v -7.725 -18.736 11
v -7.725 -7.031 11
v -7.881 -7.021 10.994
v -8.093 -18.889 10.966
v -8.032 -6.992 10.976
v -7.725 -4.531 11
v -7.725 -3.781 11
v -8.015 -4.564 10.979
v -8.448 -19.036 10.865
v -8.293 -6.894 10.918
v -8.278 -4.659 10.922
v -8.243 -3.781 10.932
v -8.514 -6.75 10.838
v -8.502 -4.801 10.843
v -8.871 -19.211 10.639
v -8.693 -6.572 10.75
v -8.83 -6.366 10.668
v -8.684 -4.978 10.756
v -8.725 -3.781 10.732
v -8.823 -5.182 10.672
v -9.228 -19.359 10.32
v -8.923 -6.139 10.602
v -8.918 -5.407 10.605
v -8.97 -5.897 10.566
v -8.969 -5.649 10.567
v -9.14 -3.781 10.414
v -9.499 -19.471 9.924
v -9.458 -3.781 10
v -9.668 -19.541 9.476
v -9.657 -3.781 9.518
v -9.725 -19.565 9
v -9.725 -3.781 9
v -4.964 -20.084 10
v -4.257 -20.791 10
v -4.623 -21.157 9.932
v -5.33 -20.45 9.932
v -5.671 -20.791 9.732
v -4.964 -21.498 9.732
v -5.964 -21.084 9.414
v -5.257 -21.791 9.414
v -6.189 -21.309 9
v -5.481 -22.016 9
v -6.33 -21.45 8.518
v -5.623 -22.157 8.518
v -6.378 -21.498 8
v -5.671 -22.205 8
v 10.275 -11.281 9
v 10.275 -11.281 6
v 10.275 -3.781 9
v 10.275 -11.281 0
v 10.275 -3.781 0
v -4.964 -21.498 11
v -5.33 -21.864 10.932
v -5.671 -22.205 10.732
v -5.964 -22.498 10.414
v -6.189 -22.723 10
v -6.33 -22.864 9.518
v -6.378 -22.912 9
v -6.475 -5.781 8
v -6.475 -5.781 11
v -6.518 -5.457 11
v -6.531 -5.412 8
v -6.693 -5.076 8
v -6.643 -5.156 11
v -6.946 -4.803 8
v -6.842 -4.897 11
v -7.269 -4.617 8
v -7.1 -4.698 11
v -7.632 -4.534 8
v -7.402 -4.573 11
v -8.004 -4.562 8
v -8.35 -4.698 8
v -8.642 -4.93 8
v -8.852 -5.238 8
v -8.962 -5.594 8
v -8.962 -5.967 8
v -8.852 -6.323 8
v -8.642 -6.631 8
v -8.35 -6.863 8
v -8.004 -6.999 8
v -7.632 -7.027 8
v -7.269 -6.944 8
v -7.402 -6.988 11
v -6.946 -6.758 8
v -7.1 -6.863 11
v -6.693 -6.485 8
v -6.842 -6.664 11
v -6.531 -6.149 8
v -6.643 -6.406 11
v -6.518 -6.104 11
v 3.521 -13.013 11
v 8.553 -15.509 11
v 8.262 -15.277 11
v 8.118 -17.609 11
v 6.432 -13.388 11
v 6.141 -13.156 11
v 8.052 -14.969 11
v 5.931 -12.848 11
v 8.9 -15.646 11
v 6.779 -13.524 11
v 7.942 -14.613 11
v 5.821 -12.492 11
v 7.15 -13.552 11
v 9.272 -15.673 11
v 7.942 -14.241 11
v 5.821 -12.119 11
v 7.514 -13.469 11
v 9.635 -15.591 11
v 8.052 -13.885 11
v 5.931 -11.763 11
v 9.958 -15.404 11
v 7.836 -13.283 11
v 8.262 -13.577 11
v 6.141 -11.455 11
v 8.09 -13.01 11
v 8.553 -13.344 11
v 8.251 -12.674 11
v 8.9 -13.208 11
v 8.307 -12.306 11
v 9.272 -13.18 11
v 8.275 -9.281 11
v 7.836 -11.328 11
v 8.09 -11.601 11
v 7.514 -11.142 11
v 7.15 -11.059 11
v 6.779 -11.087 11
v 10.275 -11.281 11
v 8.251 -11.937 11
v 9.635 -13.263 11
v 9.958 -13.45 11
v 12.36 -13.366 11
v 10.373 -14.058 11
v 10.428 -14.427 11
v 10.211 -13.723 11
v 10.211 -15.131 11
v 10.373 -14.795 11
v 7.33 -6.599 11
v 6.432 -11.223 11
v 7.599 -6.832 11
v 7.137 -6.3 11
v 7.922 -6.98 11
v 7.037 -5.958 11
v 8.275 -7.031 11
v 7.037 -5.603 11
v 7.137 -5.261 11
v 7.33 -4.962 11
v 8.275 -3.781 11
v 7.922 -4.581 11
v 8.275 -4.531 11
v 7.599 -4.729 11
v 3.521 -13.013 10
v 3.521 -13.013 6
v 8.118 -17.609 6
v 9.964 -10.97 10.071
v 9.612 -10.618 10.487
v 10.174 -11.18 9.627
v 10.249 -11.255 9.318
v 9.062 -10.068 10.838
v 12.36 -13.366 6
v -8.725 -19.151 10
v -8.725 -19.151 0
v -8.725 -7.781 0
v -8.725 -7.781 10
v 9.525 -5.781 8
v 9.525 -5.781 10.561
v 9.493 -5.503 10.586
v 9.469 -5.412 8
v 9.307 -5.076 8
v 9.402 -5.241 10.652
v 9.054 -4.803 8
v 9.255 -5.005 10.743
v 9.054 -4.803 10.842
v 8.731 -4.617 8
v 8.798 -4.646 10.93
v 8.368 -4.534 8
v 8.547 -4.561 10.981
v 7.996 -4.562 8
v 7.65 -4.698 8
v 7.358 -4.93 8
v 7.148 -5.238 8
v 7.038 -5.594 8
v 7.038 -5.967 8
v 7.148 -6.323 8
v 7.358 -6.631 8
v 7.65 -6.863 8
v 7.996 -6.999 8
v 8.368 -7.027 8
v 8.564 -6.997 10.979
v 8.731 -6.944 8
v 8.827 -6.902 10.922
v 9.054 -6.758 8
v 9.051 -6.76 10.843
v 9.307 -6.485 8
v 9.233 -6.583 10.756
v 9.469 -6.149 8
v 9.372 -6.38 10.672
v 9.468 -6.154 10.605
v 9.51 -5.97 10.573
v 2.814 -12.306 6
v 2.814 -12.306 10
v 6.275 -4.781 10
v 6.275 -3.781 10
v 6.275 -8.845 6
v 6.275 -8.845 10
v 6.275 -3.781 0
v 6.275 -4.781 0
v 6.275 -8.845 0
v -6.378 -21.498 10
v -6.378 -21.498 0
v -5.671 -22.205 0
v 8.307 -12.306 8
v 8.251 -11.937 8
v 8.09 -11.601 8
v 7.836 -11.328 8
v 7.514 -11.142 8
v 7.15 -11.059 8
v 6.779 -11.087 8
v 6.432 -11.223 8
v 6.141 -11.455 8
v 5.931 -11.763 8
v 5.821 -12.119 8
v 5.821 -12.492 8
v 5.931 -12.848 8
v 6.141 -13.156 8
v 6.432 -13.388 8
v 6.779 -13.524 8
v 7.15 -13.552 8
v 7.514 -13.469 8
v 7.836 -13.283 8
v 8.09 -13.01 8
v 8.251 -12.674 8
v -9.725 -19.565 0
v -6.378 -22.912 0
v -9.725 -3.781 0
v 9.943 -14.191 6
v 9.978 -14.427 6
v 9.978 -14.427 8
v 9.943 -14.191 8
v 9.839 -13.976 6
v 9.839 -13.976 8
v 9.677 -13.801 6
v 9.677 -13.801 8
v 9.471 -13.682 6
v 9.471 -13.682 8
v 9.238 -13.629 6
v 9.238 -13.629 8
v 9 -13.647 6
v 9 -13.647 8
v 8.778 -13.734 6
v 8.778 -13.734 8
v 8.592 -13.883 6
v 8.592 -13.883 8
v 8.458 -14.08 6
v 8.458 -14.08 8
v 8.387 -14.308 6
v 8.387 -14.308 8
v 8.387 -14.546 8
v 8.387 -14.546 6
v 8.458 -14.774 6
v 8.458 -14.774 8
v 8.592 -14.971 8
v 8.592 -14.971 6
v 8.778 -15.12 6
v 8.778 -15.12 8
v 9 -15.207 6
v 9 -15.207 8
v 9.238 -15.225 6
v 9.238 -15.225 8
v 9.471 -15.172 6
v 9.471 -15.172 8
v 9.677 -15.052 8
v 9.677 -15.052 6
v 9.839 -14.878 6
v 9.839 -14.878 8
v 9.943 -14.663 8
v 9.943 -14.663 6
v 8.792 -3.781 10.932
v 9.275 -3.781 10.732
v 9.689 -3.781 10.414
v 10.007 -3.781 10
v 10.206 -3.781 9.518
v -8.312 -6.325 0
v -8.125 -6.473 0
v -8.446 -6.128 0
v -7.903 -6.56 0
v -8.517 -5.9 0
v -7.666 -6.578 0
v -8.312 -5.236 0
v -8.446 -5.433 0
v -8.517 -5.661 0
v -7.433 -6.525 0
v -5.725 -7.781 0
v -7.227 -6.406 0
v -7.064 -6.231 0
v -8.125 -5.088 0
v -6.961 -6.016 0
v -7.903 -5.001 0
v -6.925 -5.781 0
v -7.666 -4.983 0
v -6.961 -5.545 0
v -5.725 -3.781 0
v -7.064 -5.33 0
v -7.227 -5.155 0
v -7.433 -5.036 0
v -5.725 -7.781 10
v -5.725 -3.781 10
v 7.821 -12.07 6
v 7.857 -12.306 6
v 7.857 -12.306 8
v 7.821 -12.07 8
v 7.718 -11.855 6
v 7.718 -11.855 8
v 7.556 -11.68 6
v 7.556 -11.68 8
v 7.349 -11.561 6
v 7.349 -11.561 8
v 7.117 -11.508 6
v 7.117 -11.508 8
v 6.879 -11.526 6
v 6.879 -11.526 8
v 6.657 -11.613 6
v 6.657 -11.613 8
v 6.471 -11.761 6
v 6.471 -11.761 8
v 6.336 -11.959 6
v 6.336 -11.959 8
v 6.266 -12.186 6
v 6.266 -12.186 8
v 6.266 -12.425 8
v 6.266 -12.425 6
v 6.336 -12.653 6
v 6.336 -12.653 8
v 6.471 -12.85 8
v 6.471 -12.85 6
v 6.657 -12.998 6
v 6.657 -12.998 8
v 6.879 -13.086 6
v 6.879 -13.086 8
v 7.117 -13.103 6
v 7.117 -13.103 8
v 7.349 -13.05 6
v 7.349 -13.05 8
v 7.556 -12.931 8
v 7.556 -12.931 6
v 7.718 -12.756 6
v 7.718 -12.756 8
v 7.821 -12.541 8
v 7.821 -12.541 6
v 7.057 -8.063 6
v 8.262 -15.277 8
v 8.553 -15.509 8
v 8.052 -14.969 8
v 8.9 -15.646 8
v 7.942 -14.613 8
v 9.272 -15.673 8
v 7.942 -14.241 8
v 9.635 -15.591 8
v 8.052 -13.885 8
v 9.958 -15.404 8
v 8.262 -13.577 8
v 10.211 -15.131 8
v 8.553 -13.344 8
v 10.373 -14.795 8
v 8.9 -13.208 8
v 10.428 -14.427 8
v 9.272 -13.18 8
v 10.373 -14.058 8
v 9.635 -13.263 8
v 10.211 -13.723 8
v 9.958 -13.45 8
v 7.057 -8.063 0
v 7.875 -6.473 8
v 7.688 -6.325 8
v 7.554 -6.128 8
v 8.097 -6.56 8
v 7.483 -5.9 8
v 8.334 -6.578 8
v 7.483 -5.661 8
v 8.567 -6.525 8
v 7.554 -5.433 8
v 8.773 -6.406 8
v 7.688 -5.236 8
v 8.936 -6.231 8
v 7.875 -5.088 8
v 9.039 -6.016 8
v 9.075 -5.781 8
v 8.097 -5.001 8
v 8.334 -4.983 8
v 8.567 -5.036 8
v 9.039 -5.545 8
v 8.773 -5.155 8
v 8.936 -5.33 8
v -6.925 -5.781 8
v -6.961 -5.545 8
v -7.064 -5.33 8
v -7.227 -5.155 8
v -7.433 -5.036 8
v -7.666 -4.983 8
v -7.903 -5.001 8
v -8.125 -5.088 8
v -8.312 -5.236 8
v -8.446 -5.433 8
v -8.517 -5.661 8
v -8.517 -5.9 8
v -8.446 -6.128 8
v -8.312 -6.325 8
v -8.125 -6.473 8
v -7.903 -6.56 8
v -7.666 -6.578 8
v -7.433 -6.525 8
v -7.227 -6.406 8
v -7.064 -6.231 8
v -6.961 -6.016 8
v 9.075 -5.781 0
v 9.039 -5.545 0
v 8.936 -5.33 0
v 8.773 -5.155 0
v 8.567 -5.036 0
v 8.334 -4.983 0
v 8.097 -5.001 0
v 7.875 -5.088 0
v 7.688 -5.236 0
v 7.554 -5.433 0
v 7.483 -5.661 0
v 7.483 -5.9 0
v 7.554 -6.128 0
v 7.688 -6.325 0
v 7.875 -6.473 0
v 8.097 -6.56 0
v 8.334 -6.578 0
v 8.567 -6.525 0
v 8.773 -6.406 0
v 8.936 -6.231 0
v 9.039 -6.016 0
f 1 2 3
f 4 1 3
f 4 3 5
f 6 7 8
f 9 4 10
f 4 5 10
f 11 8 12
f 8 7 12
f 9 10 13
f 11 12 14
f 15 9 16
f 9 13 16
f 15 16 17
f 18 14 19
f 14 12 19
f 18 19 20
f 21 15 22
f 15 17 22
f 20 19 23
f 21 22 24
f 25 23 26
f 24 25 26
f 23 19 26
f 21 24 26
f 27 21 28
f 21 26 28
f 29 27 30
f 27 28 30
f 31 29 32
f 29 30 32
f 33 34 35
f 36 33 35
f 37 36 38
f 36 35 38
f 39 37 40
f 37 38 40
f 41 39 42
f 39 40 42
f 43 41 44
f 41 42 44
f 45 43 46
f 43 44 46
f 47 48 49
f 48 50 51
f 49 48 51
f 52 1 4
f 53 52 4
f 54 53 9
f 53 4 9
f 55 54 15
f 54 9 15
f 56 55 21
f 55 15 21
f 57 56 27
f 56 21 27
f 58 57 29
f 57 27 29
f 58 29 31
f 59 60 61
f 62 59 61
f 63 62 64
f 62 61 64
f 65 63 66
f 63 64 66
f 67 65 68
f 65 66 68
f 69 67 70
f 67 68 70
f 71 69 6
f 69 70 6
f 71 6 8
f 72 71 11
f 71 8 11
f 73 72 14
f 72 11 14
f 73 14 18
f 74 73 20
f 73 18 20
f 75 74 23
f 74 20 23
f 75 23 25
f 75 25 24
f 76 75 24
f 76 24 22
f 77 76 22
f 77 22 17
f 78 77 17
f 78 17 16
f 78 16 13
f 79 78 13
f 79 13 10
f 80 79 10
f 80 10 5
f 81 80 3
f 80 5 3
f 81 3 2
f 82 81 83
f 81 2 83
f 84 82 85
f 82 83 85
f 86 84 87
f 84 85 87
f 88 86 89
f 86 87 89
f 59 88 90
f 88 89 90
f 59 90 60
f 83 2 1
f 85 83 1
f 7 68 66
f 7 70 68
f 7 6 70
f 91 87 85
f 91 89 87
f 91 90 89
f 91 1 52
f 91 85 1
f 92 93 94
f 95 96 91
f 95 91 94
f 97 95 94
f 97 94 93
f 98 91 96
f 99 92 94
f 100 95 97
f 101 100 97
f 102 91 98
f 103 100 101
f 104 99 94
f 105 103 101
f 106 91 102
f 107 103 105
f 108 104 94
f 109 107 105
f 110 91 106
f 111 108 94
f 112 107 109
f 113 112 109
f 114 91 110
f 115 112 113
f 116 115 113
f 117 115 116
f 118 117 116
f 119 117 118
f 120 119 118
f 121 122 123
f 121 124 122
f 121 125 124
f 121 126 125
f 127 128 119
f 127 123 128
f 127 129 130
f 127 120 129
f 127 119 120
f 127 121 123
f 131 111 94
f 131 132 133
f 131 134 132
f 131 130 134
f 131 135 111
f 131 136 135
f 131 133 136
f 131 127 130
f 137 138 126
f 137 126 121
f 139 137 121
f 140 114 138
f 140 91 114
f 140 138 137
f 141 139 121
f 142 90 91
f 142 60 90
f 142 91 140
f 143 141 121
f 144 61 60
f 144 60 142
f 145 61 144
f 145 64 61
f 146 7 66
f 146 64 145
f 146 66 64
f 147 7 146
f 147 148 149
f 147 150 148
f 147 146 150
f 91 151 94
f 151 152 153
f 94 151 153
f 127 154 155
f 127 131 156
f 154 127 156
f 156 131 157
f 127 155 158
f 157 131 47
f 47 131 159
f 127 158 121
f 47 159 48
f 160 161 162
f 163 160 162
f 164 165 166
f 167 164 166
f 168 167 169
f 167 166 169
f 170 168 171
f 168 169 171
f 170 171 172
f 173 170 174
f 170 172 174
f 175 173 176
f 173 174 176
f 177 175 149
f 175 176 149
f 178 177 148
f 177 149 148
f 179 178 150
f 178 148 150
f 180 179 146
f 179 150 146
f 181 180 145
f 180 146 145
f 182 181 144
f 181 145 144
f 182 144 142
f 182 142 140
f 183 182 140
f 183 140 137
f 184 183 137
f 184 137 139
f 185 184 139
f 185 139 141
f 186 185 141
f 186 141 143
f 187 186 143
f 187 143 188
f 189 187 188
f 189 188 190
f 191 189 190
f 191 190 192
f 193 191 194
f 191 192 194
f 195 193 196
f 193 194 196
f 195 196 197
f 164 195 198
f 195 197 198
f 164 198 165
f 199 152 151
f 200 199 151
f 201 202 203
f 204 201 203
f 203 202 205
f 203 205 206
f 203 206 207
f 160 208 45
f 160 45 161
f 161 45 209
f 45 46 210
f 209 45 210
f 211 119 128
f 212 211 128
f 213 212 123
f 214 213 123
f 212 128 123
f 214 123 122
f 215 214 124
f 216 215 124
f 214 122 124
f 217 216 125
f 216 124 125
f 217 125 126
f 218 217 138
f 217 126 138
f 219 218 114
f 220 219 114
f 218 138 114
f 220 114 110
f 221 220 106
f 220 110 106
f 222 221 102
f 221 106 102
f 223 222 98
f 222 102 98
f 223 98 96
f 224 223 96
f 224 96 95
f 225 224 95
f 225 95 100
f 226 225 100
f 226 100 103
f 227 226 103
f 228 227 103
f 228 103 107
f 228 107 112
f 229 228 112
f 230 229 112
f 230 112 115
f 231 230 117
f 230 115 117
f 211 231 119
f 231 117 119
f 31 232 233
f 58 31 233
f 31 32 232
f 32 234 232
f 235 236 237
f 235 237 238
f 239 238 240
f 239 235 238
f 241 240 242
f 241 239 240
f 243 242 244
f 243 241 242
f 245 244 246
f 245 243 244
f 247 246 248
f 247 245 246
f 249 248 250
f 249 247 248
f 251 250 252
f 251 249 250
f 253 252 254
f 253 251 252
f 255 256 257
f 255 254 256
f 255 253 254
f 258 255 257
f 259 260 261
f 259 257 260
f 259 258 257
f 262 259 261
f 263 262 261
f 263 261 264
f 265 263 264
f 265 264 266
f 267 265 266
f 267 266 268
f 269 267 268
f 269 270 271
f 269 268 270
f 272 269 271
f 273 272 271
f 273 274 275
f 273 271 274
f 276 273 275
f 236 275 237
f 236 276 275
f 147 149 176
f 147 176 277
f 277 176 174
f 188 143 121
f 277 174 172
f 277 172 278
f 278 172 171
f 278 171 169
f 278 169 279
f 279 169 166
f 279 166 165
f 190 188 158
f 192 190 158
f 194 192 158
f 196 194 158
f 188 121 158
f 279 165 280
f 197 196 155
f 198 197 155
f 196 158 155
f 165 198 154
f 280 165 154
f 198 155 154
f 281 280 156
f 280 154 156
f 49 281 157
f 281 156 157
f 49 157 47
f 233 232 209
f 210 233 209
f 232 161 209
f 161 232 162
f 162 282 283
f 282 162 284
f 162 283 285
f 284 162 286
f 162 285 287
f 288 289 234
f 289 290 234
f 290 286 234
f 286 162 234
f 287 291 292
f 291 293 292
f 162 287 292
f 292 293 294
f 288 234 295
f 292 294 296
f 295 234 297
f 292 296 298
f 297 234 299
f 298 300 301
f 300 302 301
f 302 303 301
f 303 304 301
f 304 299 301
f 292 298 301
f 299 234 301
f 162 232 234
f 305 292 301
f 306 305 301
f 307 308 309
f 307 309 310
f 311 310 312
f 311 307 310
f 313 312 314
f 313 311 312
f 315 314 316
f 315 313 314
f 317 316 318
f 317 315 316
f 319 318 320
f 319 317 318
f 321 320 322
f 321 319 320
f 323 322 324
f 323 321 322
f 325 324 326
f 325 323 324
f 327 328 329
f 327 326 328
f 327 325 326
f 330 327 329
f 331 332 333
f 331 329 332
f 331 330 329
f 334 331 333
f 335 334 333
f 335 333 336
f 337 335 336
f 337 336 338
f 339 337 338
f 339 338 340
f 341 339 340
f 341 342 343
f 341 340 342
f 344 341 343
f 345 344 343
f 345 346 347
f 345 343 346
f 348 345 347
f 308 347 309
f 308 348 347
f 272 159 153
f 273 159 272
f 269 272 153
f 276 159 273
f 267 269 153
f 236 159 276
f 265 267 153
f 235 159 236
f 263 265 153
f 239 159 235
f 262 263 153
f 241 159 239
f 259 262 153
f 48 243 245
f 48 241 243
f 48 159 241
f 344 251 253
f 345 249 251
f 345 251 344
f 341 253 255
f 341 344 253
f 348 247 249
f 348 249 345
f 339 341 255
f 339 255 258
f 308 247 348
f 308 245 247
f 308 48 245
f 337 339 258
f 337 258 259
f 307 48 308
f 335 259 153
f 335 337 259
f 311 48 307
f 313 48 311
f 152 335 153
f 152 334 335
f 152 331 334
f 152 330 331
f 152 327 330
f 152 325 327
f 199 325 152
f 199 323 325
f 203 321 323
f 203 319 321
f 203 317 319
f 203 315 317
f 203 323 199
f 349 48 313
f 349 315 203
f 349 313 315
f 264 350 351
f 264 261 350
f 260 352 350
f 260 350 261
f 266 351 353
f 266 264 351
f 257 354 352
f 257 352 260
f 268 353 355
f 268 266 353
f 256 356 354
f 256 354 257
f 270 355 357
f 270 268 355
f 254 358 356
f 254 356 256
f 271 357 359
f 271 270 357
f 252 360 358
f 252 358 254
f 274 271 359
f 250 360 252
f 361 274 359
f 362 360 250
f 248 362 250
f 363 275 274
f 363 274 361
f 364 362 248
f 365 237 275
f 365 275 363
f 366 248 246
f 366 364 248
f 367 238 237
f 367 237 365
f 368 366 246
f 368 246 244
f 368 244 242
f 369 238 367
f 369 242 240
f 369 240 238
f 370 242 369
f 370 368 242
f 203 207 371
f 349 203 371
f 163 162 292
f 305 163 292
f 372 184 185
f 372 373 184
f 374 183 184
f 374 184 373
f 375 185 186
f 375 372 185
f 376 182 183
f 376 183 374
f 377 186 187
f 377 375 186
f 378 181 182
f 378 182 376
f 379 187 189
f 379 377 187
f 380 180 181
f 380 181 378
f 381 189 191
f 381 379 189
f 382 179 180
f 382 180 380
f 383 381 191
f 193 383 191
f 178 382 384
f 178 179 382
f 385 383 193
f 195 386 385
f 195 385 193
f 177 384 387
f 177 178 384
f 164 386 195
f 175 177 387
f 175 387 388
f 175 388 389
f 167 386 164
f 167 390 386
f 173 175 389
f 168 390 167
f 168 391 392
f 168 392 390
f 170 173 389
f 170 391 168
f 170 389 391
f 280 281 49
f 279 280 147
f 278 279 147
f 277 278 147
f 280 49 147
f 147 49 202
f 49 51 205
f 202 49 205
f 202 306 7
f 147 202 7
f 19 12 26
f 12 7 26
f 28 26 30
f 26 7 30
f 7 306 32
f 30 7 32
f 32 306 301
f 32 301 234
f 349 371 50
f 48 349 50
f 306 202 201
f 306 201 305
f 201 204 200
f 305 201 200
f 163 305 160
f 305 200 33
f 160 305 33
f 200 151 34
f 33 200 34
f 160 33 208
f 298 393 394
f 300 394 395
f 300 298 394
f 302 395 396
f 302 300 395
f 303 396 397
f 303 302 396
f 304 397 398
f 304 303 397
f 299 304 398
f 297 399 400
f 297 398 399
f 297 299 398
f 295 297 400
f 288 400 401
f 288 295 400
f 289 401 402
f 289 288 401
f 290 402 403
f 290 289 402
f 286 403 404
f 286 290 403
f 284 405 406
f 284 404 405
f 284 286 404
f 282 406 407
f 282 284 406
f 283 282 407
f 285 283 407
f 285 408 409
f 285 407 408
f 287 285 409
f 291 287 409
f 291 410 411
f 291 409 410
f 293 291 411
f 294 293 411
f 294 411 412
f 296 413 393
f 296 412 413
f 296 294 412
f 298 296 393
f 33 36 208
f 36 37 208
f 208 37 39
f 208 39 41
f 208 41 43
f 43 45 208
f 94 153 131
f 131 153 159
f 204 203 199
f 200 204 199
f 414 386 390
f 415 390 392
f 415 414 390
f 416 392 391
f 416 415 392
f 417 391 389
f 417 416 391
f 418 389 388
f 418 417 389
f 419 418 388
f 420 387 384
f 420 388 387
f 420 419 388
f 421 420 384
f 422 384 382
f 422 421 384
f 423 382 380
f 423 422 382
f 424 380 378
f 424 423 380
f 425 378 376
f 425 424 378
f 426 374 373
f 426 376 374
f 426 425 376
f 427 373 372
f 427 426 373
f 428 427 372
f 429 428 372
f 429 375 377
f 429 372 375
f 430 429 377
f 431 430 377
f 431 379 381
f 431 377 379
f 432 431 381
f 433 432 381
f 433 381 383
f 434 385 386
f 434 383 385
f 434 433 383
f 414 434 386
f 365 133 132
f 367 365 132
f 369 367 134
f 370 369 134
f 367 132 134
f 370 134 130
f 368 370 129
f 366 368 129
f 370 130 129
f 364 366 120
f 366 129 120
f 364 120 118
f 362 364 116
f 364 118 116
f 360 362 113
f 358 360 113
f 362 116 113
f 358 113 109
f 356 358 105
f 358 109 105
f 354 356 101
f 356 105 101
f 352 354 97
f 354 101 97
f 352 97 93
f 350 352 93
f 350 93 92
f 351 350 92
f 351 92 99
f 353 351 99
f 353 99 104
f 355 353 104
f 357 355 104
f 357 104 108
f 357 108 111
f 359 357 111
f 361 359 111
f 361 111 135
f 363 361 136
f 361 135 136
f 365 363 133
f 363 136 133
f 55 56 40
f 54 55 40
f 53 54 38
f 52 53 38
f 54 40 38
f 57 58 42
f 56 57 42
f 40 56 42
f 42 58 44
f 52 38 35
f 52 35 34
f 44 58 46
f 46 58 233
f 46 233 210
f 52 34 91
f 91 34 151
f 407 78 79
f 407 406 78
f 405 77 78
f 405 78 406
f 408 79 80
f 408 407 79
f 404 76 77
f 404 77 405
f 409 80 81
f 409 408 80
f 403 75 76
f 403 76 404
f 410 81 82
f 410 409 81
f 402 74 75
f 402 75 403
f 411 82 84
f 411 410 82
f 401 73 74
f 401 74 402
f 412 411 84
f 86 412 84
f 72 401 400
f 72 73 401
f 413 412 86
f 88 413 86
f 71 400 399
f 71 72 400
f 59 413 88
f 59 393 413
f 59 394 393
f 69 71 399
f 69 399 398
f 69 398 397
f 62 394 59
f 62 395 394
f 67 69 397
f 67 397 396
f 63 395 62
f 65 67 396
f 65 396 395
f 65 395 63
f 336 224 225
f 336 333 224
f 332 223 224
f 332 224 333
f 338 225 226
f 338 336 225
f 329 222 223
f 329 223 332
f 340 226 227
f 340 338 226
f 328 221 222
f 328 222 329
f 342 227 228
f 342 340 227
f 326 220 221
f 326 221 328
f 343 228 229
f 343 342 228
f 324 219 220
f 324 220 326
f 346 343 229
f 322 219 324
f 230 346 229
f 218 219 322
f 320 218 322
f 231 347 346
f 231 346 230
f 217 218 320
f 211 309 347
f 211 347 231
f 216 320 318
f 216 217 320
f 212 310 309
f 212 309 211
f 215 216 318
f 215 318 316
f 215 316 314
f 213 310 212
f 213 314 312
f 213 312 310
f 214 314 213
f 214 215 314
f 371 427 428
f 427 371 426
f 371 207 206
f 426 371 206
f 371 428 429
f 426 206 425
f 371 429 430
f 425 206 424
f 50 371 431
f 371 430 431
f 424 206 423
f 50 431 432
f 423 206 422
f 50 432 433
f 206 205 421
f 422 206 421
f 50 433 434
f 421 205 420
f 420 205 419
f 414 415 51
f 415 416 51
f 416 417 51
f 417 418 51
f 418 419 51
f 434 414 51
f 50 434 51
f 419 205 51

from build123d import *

# Parameters (mm, degrees)
BOSS_EXTRUDE1_DEPTH      = 11
BOSS_EXTRUDE2_START      = 11
BOSS_EXTRUDE2_DEPTH      = 1
SKETCH6_W                = 12
SKETCH6_H                = 1
UPPER_TUBE_OPENING_DEPTH = 10
LOWER_TUBE_OPENING_DEPTH = 1
SKETCH4_R                = 0.800000001
SKETCH4_R_2              = 0.800000002
SCREW_HOLES_DEPTH        = 29.262100116
SCREW_START              = 11
SKETCH5_R                = 1.25
SCREW_HEADS_DEPTH        = 3
FILLET1_R                = 2
CUT_EXTRUDE1_DEPTH       = 6


with BuildPart() as part:
    # Sketch2 → Boss-Extrude1 (new body)
    with BuildSketch(Plane.XY):
        Polygon((-6.378060684, -22.912224964), (3.521434253, -13.012730028), (8.11762833, -17.608924106), (12.360269017, -13.366283419), (10.274522062, -11.280536464), (10.274522062, -3.780536464), (-9.725477938, -3.780536464), (-9.725477938, -19.56480771), align=None)
        Polygon((-5.725477938, -7.780536464), (-5.725477938, -4.780536464), (6.274522063, -4.780536464), (6.274522063, -8.845428655), (-6.378060684, -21.498011402), (-8.725477938, -19.150594148), (-8.725477938, -7.780536464), align=None, mode=Mode.SUBTRACT)
    extrude(amount=BOSS_EXTRUDE1_DEPTH)

    # Sketch3 → Boss-Extrude2 (add)
    with BuildSketch(Plane.XY.offset(BOSS_EXTRUDE2_START)):
        Polygon((-6.378060684, -22.912224964), (3.521434253, -13.012730028), (8.11762833, -17.608924106), (12.360269017, -13.366283419), (10.274522062, -11.280536464), (10.274522062, -3.780536464), (-9.725477938, -3.780536464), (-9.725477938, -19.56480771), align=None)
    extrude(amount=-BOSS_EXTRUDE2_DEPTH)

    # Sketch6 → Upper Tube Opening (cut)
    with BuildSketch(Plane.XY):
        with Locations((0.274522062, -4.280536464)):
            Rectangle(SKETCH6_W, SKETCH6_H)
    extrude(amount=UPPER_TUBE_OPENING_DEPTH, mode=Mode.SUBTRACT)

    # Sketch7 → Lower Tube Opening (cut)
    with BuildSketch(Plane(origin=(8.26708214, -8.26708214, 0), x_dir=(0, 0, -1), z_dir=(0.7071067811865477, -0.7071067811865475, 0))):
        with BuildLine():
            Line((-8, -19.711359605), (0, -19.711359605))
            Line((0, -19.711359605), (0, -6.711359605))
            Line((0, -6.711359605), (-10, -6.711359605))
            Line((-10, -6.711359605), (-10, -17.711359605))
            ThreePointArc((-10, -17.711359605), (-9.414213562, -19.125573167), (-8, -19.711359605))
        make_face()
    extrude(amount=-LOWER_TUBE_OPENING_DEPTH, mode=Mode.SUBTRACT)

    # Sketch4 → Screw Holes (cut, through all)
    with BuildSketch(Plane.XY):
        with Locations((9.178288502, -14.426943591)):
            Circle(SKETCH4_R)
        with Locations((7.056968158, -12.305623247)):
            Circle(SKETCH4_R)
        with Locations((-7.725477938, -5.780536464)):
            Circle(SKETCH4_R_2)
        with Locations((8.274522062, -5.780536464)):
            Circle(SKETCH4_R_2)
    extrude(amount=SCREW_HOLES_DEPTH, mode=Mode.SUBTRACT)

    # Sketch5 → Screw Heads (cut)
    with BuildSketch(Plane.XY.offset(SCREW_START)):
        with Locations((-7.725477938, -5.780536464)):
            Circle(SKETCH5_R)
        with Locations((8.274522062, -5.780536464)):
            Circle(SKETCH5_R)
        with Locations((7.056968158, -12.305623247)):
            Circle(SKETCH5_R)
        with Locations((9.178288502, -14.426943591)):
            Circle(SKETCH5_R)
    extrude(amount=-SCREW_HEADS_DEPTH, mode=Mode.SUBTRACT)

    # Fillet1
    # the kernel refuses this fillet: 2 mm, written as the material it takes off along each edge
    with BuildSketch(Plane(origin=(10.274522062, -16.280536464, 11), x_dir=(-1, 0, 0), z_dir=(0, 1, 0))) as fillet1_piece_1_section:
        with BuildLine():
            CenterArc((FILLET1_R, -FILLET1_R), FILLET1_R, 90, 90)
            Line((0, -FILLET1_R), (0, 0))
            Line((0, 0), (FILLET1_R, 0))
        make_face()
    fillet1_piece_1 = extrude(amount=17.5, mode=Mode.PRIVATE)
    fillet1_piece_1 = split(fillet1_piece_1, bisect_by=Plane(origin=(6.821503017, -7.82751742, 10.5380934), z_dir=(0.707106781186547, 0.7071067811865481, 0)), keep=Keep.TOP, mode=Mode.PRIVATE)
    add(fillet1_piece_1, mode=Mode.SUBTRACT)
    with BuildSketch(Plane(origin=(-9.725477938, 1.219463536, 11), x_dir=(1, 0, 0), z_dir=(0, -1, 0))) as fillet1_piece_2:
        with BuildLine():
            CenterArc((FILLET1_R, -FILLET1_R), FILLET1_R, 90, 90)
            Line((0, -FILLET1_R), (0, 0))
            Line((0, 0), (FILLET1_R, 0))
        make_face()
    extrude(amount=25.784271246, mode=Mode.SUBTRACT)
    with BuildSketch(Plane(origin=(-13.261011844, -16.029273804, 11), x_dir=(0.7071067811865474, 0.7071067811865478, 0), z_dir=(0.7071067811865478, -0.7071067811865474, 0))) as fillet1_piece_3:
        with BuildLine():
            CenterArc((FILLET1_R, -FILLET1_R), FILLET1_R, 90, 90)
            Line((0, -FILLET1_R), (0, 0))
            Line((0, 0), (FILLET1_R, 0))
        make_face()
    extrude(amount=14.73396288, mode=Mode.SUBTRACT)

    # Sketch10 → Cut-Extrude1 (cut)
    with BuildSketch(Plane.XY):
        Polygon((12.360269017, -13.366283419), (8.11762833, -17.608924106), (2.814327472, -12.305623247), (7.056968158, -8.06298256), align=None)
    extrude(amount=CUT_EXTRUDE1_DEPTH, mode=Mode.SUBTRACT)


solid = part.part
